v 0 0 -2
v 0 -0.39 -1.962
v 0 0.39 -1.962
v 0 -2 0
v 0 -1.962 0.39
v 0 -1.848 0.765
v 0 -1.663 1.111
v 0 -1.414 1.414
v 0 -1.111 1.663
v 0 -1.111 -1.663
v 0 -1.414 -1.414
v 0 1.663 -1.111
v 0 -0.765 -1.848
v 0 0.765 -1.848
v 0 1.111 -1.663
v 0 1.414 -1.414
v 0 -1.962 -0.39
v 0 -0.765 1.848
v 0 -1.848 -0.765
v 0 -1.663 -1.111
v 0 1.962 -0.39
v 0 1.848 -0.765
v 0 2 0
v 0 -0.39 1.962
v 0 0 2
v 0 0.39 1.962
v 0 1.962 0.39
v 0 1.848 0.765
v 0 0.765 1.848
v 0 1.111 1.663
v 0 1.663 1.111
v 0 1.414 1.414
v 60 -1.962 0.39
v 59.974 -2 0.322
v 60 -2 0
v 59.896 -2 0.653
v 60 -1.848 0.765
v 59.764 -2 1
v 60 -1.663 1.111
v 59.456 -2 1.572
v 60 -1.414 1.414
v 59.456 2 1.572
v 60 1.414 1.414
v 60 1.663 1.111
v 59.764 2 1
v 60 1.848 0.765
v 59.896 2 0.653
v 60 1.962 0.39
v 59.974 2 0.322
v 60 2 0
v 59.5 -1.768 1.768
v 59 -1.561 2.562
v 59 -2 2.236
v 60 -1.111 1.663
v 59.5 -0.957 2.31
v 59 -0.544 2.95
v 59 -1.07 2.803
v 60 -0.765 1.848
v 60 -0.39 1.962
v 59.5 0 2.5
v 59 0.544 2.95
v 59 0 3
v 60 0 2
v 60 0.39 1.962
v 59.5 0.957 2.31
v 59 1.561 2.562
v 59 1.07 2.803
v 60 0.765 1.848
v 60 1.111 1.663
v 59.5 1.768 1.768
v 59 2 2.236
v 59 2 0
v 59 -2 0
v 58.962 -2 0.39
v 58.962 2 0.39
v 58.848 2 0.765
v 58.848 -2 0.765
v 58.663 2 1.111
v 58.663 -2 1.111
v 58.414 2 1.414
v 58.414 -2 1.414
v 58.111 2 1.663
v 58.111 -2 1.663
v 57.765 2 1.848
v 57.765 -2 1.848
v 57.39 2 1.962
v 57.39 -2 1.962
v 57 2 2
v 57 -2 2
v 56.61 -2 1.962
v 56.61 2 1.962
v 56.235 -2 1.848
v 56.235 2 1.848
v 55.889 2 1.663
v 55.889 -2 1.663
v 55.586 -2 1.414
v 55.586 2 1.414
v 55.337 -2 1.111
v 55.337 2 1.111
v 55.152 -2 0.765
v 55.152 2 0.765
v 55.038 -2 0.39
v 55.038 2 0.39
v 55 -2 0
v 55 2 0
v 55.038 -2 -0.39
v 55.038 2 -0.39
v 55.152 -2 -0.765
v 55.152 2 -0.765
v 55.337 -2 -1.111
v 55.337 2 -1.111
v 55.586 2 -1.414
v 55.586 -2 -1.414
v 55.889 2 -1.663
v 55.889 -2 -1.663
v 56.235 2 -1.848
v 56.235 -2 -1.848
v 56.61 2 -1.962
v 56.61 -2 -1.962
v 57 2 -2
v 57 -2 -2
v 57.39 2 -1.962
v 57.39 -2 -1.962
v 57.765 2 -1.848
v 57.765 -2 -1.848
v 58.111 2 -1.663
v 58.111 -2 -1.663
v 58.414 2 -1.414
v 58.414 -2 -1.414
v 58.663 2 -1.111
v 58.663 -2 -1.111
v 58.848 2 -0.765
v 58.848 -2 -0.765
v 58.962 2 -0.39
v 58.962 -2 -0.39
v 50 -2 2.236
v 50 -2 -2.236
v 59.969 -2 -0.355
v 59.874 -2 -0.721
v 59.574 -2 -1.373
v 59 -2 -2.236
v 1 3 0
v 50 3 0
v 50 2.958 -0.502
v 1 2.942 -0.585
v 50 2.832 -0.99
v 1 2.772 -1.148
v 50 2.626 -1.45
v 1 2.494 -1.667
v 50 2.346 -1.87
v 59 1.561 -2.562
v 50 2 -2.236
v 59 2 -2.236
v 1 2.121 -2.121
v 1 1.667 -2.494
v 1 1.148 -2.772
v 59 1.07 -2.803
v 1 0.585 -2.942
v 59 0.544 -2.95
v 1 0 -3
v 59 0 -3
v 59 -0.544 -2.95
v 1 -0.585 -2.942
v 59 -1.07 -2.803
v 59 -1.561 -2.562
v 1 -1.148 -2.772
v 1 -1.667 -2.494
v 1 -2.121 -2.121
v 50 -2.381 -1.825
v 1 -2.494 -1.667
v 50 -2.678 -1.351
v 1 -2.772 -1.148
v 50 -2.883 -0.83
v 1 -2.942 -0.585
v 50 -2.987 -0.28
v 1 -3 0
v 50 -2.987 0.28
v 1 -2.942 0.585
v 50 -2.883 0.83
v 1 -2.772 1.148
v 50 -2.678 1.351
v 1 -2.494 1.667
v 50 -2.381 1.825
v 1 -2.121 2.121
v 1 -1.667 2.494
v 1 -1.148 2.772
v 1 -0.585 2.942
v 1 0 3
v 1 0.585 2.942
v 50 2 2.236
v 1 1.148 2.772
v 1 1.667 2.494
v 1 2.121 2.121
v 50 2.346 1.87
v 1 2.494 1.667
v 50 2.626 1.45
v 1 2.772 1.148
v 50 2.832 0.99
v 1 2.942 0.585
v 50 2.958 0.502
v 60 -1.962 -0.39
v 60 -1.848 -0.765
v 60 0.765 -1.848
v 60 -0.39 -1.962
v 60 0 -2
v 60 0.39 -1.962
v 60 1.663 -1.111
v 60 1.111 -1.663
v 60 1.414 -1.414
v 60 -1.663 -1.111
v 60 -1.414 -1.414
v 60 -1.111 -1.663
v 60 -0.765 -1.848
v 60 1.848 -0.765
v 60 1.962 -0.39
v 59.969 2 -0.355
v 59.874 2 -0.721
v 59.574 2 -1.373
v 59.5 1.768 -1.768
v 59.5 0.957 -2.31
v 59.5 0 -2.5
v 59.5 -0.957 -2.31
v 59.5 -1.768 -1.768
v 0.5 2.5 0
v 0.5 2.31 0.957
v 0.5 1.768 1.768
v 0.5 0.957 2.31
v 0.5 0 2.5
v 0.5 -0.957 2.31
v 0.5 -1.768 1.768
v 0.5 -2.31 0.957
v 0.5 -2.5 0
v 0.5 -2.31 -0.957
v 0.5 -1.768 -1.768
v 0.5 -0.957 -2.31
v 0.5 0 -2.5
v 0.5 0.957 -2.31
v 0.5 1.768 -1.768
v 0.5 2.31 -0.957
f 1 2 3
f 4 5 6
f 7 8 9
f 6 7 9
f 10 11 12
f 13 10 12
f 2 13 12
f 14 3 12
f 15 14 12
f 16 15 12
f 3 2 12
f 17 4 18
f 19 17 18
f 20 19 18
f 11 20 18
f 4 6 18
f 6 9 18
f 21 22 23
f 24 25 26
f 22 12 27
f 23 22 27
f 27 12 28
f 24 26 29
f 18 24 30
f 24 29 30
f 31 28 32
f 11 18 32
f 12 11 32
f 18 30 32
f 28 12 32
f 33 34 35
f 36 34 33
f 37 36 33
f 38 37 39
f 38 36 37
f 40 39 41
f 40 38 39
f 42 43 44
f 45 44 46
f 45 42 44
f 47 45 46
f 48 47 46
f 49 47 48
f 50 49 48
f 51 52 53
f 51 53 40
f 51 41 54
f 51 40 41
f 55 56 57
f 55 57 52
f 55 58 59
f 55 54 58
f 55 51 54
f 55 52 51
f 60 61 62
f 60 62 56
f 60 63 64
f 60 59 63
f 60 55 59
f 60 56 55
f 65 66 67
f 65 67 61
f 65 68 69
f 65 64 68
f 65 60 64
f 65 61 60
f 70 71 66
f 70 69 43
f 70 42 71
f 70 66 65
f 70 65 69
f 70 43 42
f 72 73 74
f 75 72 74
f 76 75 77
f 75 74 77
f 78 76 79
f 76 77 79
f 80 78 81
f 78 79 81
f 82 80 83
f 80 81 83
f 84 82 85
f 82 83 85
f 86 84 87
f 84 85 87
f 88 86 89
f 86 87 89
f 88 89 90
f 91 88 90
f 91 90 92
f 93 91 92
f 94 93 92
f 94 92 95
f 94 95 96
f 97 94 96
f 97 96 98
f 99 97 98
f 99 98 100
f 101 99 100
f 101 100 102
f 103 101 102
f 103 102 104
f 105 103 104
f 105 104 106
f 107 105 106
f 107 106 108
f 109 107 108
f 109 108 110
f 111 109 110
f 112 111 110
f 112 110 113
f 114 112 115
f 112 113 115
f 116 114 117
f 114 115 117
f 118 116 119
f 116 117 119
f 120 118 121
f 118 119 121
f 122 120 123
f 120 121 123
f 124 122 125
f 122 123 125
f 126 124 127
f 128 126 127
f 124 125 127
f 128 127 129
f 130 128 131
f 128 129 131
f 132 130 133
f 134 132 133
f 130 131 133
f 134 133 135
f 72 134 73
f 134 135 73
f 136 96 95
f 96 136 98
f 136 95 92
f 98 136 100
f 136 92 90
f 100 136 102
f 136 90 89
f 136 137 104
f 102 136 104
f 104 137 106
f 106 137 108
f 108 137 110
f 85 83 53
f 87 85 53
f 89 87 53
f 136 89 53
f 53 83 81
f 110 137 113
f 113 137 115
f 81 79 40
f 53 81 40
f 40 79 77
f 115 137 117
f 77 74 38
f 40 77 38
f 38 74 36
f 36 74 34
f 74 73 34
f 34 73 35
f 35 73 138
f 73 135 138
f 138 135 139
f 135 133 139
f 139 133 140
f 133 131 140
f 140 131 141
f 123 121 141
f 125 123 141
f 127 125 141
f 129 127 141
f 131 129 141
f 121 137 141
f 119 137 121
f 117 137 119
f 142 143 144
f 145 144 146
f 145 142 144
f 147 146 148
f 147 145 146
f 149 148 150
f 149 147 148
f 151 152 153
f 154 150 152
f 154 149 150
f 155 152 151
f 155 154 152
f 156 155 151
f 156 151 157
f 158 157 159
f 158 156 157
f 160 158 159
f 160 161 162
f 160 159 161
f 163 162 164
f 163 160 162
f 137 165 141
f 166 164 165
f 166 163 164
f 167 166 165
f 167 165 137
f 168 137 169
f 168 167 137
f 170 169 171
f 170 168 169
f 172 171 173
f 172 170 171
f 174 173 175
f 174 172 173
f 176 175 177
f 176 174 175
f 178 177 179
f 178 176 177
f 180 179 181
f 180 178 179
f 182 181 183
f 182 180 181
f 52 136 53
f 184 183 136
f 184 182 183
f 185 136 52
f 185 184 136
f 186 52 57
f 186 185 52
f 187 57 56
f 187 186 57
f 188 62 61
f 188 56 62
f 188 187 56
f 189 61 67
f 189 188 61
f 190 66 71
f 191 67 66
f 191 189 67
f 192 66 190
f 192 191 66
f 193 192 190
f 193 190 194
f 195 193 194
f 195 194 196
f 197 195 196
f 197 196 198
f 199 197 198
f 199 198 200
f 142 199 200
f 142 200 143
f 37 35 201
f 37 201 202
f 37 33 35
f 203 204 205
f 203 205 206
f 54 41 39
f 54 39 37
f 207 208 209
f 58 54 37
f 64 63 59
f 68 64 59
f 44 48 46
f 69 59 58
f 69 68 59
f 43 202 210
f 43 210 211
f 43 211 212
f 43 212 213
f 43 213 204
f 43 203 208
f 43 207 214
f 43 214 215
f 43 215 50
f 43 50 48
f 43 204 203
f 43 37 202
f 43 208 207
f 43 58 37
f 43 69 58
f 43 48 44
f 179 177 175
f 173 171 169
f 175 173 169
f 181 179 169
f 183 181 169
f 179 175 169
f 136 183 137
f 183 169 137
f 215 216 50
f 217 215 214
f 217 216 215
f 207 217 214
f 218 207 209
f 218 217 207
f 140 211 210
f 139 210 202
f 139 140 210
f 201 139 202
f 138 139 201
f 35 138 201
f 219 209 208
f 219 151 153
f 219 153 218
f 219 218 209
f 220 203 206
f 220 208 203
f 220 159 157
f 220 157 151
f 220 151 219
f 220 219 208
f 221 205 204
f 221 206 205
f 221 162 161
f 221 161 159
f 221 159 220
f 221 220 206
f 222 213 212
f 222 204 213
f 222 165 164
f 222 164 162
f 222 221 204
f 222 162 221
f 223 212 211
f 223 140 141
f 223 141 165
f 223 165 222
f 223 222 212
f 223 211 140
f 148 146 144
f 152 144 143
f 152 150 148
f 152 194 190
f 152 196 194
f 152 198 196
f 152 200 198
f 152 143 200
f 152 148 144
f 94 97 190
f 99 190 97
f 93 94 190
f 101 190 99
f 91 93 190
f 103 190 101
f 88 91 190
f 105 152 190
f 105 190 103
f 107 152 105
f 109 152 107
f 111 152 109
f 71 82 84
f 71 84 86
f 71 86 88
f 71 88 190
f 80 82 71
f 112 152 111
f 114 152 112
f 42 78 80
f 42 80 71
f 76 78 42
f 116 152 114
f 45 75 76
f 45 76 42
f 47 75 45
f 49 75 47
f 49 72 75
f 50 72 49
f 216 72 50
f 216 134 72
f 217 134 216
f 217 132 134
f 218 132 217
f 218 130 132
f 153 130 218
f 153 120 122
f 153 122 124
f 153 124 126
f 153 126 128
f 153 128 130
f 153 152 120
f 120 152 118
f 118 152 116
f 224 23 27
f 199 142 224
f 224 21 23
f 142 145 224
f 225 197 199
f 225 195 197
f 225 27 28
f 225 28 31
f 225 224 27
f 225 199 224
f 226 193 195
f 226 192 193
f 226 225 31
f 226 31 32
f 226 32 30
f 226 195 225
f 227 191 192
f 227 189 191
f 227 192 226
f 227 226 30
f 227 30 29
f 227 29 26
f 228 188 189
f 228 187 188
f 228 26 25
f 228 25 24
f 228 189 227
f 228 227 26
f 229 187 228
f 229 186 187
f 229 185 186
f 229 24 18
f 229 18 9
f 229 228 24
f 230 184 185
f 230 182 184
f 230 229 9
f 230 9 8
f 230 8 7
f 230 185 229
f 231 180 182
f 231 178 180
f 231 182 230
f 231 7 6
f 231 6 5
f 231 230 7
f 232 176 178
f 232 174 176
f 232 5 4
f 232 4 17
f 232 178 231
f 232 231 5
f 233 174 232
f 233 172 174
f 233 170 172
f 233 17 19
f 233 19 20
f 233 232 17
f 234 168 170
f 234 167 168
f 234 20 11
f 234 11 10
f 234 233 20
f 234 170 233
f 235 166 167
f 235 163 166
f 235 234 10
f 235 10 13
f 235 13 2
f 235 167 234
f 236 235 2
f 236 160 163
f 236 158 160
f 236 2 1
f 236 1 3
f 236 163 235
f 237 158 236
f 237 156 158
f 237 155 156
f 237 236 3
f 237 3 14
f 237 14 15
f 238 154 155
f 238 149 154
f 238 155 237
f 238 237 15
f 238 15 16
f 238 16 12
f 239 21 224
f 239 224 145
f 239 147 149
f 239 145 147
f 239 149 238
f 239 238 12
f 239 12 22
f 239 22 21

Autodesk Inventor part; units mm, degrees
ref_plane "YZ Plane" through (0, 0, 0) normal (1, 0, 0) x (0, 1, 0)
ref_plane "XZ Plane" through (0, 0, 0) normal (0, 1, 0) x (-1, 0, 0)
ref_plane "XY Plane" through (0, 0, 0) normal (0, 0, 1) x (1, 0, 0)
sketch "Sketch1" plane through (0, 0, 0) normal (0, 0, 1) x (1, 0, 0)
  line L0 (0, 0) -> (60, 0)
  line L1 (60, 0) -> (60, 3)
  line L2 (60, 3) -> (0, 3)
  line L3 (0, 3) -> (0, 0)
  dimension "d0" = 60
  dimension "d1" = 6
revolve "Revolution1" add sketch "Sketch1" angle 360 about axis through (0, 0, 0) along (1, 0, 0)
thread "Thread1" size "M6x1" class "6g" standard "ANSI Metric M Profile" length 15
chamfer "Chamfer1" distance 1 angle 45 2 edges at (0, -3, 0) (60, -3, 0)
sketch "Sketch2" plane through (0, 0, 0) normal (0, 0, 1) x (1, 0, 0)
  line L0 (1, 3) -> (59, 3) projected
  line L1 (60, 3) -> (50, 3)
  line L2 (50, 3) -> (50, 2)
  line L3 (50, 2) -> (60, 2)
  line L4 (60, 2) -> (60, 3)
  line L5 (60, -3) -> (60, 3) projected
  line L6 (60, -3) -> (50, -3)
  line L7 (50, -3) -> (50, -2)
  line L8 (50, -2) -> (60, -2)
  line L9 (60, -2) -> (60, -3)
  point P0 (0, 0)
  point P1 (50, 3)
  dimension "d8" = 4
  dimension "d15" = 10
extrude "Extrusion1" cut sketch "Sketch2" along normal through all both and the other way through all
sketch "Sketch3" plane through (50, -2, -2.2361) normal (0, -1, 0) x (1, 0, 0)
  circle A0 centre (7, 2.2361) radius 2
  line L0 (10, 2.2361) -> (10, 0.2361) projected
  point P0 (-50, 2.2361)
  dimension "d11" = 4
  dimension "d14" = 3
extrude "Extrusion2" cut sketch "Sketch3" against normal through all
properties part number "M6x1_THREADED_ROD_CPY_CPY"
